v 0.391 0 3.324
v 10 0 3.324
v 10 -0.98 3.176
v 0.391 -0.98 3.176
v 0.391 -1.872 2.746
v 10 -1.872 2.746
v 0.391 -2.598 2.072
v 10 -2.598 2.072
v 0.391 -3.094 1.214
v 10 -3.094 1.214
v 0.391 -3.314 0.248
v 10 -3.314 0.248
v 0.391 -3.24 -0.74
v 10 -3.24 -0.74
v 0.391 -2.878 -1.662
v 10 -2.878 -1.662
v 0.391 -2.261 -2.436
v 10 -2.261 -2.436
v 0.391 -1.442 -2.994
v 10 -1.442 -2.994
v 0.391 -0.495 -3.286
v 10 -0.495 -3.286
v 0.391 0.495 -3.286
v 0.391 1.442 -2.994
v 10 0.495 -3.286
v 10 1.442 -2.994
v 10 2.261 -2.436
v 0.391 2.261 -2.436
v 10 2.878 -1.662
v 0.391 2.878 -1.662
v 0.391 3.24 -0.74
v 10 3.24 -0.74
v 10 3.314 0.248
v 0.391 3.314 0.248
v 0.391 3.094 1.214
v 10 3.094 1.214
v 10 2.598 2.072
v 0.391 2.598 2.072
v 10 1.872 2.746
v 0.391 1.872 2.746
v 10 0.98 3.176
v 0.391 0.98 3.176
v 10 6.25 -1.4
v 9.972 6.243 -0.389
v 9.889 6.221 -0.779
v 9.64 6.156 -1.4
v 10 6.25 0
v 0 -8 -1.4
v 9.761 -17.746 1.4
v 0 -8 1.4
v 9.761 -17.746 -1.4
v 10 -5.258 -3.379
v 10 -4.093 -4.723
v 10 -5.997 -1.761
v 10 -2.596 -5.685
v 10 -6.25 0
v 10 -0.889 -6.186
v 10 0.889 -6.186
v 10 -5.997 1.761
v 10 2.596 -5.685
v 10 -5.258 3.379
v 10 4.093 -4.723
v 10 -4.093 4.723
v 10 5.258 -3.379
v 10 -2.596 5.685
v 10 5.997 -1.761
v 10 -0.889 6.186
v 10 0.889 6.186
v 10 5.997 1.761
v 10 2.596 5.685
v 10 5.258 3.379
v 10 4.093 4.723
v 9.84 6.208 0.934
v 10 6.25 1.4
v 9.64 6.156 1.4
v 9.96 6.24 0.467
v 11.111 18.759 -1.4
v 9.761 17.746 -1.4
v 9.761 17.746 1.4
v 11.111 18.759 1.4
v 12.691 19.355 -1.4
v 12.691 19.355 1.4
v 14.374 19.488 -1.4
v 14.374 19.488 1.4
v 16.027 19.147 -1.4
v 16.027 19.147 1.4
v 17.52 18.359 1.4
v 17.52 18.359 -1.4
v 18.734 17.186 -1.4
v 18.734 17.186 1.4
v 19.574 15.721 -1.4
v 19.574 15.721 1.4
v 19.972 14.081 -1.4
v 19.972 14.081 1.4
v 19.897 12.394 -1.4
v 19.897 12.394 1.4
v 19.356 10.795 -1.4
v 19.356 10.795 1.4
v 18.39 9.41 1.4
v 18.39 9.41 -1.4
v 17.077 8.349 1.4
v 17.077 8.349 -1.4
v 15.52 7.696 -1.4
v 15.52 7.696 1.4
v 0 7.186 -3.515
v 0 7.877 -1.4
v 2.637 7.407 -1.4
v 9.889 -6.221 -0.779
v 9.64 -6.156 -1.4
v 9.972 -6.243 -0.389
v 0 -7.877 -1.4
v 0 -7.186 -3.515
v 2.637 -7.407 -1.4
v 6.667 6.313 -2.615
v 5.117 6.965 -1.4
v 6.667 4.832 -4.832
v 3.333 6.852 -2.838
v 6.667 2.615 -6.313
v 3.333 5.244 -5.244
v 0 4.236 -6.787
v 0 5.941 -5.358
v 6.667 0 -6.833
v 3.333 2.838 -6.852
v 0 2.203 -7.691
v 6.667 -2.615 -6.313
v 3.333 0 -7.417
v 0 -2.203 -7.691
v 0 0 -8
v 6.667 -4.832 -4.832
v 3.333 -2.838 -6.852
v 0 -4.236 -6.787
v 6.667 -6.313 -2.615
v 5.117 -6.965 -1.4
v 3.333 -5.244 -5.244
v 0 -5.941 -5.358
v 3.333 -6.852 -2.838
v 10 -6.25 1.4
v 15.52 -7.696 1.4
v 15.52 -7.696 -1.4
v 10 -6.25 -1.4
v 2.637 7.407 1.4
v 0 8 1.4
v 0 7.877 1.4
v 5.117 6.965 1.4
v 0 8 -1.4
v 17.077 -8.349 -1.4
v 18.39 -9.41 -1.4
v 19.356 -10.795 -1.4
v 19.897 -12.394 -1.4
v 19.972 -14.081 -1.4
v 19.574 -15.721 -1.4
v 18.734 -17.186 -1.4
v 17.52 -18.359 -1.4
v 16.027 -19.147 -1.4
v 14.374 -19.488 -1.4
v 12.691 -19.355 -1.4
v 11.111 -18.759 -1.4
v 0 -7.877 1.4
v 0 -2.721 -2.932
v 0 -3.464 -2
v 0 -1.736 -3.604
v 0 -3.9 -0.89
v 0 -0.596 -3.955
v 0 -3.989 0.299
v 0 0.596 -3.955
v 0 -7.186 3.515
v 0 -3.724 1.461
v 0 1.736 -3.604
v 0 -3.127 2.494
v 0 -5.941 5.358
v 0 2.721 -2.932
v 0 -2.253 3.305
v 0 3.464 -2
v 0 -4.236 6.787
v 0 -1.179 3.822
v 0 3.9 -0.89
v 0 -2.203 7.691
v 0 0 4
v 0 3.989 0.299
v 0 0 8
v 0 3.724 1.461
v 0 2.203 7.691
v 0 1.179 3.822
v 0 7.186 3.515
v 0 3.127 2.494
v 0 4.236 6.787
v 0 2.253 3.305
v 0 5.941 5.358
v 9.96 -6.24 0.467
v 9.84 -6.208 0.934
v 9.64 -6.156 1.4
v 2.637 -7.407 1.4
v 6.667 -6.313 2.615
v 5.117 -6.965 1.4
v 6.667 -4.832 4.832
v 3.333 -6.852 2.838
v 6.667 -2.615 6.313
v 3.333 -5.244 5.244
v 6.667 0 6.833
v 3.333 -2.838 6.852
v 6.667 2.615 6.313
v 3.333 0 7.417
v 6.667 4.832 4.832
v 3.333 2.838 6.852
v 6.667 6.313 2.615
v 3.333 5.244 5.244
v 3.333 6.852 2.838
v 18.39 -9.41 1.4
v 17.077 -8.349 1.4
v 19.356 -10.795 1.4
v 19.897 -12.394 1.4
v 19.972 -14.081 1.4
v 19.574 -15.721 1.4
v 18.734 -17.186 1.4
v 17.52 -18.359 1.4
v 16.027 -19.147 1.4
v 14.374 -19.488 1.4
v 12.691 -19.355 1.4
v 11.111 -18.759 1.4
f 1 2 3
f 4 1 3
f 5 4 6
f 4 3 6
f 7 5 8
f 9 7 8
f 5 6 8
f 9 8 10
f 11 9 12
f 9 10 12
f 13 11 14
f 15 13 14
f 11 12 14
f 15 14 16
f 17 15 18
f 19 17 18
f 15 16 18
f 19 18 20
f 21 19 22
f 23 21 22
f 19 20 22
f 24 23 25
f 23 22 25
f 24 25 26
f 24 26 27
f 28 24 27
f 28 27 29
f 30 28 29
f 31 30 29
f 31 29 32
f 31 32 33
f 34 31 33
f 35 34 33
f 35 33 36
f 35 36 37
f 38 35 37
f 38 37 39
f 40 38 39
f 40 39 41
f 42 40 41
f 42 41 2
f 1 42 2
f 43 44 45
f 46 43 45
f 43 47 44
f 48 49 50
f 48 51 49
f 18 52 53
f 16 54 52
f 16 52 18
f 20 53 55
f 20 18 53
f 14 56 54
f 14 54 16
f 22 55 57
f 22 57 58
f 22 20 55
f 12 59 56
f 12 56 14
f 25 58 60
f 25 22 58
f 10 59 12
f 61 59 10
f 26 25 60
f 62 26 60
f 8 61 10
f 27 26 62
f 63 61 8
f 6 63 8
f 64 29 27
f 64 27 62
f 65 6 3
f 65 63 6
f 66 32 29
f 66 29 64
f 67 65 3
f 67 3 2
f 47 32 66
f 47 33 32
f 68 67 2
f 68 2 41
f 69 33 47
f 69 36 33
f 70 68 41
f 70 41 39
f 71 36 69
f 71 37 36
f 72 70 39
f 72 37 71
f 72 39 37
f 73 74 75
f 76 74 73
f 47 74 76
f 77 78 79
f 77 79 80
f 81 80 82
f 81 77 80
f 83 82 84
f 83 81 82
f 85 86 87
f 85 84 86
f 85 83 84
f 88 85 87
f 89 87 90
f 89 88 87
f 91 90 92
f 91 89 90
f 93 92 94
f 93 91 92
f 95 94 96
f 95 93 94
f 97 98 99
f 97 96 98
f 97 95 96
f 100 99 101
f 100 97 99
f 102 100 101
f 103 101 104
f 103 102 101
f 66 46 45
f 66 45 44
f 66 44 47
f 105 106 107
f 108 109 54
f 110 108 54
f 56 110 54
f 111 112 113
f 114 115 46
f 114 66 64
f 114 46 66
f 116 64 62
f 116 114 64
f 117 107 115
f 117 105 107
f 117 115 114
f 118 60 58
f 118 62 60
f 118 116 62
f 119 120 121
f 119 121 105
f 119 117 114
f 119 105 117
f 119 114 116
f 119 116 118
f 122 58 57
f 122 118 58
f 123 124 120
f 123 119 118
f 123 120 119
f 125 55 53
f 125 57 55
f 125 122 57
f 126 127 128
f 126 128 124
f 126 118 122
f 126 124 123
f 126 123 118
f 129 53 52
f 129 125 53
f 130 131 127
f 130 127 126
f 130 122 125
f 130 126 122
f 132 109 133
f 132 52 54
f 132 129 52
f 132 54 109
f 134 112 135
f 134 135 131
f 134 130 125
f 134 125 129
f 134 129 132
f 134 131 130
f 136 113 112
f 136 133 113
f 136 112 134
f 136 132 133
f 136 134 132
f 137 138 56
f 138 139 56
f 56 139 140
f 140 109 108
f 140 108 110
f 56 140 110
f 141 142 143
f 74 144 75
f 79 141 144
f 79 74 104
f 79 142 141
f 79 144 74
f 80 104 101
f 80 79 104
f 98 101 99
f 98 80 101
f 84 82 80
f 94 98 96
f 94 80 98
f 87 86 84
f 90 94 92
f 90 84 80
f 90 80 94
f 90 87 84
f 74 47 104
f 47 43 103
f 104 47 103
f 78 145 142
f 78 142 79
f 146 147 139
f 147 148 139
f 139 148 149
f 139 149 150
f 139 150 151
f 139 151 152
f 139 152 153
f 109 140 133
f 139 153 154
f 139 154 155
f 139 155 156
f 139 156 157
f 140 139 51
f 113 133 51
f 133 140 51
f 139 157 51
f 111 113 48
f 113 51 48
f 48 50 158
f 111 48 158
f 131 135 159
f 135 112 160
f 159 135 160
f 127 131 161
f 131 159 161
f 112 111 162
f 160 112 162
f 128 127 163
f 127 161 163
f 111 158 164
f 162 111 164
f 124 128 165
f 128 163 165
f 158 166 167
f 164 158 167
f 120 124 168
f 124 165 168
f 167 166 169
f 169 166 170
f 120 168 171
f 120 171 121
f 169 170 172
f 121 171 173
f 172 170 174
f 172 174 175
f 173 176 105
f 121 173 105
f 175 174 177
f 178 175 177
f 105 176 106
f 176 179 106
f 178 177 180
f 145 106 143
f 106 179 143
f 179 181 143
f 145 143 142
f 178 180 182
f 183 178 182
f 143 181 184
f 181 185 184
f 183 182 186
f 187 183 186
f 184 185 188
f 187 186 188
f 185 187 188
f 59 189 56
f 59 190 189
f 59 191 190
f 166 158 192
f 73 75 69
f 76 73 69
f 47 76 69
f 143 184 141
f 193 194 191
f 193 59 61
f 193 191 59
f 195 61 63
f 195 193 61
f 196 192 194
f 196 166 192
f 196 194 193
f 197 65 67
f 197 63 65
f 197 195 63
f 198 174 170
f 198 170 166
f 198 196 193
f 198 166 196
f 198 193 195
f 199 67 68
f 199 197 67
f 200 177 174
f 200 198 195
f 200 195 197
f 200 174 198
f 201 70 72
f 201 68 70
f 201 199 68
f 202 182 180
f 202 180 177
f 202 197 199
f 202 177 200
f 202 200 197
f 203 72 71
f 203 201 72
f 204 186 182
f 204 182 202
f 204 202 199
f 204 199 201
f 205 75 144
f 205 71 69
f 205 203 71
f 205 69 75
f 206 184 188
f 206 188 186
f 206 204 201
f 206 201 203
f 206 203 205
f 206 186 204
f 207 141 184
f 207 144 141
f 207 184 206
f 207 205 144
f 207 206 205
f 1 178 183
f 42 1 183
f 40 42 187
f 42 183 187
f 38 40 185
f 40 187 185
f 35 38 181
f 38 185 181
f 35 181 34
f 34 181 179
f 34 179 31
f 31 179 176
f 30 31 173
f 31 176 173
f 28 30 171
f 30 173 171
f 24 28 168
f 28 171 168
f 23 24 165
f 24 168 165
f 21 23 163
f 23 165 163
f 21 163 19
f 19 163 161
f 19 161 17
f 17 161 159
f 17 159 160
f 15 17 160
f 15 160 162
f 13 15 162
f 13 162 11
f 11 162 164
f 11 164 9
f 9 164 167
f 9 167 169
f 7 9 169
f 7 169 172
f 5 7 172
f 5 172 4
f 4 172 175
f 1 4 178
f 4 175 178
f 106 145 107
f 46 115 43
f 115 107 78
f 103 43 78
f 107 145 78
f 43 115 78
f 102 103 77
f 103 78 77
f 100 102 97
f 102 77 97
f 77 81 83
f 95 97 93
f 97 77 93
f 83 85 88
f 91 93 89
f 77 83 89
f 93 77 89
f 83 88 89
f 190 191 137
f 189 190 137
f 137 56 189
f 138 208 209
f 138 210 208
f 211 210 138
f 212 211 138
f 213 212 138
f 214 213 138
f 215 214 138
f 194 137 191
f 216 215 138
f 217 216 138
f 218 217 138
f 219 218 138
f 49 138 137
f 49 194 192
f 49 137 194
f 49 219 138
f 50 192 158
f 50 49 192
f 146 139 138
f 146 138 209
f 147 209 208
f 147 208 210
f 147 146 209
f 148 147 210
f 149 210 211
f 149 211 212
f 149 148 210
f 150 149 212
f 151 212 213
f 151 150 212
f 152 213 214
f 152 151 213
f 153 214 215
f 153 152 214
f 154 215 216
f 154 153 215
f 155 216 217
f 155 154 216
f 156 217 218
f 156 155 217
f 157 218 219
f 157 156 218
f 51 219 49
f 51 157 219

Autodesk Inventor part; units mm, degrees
ref_plane "YZ Plane" through (0, 0, 0) normal (1, 0, 0) x (0, 1, 0)
ref_plane "XZ Plane" through (0, 0, 0) normal (0, 1, 0) x (-1, 0, 0)
sketch "Sketch1" plane through (0, 0, 0) normal (0, 0, 1) x (1, 0, 0)
  line L0 (0, 0) -> (10, 0)
  line L1 (0, 0) -> (0, 8)
  line L2 (10, 6.25) -> (10, 0)
  line L3 (0, 8) -> (9.7606, 17.7458)
  line L4 (10, 6.25) -> (15.5202, 7.6958)
  arc A0 (15.5202, 7.6958) -> (9.7606, 17.7458) centre (14, 13.5) ccw
  line L5 (10, 6.25) -> (0, 8)
  line L6 (10, 6.25) -> (0, 3.6309)
  dimension "d0" = 12.5
  dimension "d1" = 14
  dimension "d2" = 13.5
  dimension "d3" = 6
  dimension "d4" = 10
  dimension "d5" = 16
revolve "Body" add sketch "Sketch1" angle 360 about axis through (0, 0, 0) along (1, 0, 0) contours L1 L6 L2 L0 | L1 L5 L6
extrude "Wing1" add sketch "Sketch1" along normal mid plane 2.8 contours L1 L5 L6 | L5 L3 A0 L4
fillet "Fillet1" [suppressed]
mirror "Wing2" about plane through (0, 0, 0) normal (0, 1, 0) of "Wing1"
sketch "Sketch2" plane through (0, 0, 0) normal (1, 0, 0) x (0, 1, 0)
  line L0 (0, -14) -> (0, 14) projected
  line L1 (-14, 0) -> (14, 0) projected
  point P0 (0, 0)
hole "Thread" at (0, 0, 0) direction (1, 0, 0) diameter 6.647 end through all thread size "M8x1.25" class "6H" standard "ISO Metric profile"
chamfer "Chamfer1" distance 0.6766 angle 30 1 edges at (0, 0, -3.3235) measured on face at (0, -6.3508, -0.1335)
ref_plane "Work Plane1" through (46.6583, 0, 0) normal (0, 0, -1) x (1, 0, 0)
equation "\"d0\" = KOD2"
equation "\"d1\" = KOH1 - RR"
equation "\"d2\" = 0.5 * E0 - RR"
equation "\"d3\" = RR"
equation "\"d4\" = KOH"
equation "\"d5\" = KOD"
equation "\"d6\" = SW"
equation "\"d8\" = 0.333333 * SW"
equation "\"d9\" = -0.5 * GD1 + 0.5 * NND"
equation "\"d109\" = -0.5 * GD1 + 0.5 * NND"
equation "\"NND\" = 8"
equation "\"KOH\" = 10"
equation "\"KOH1\" = 20"
equation "\"SW\" = 2.8"
equation "\"KOD\" = 16"
equation "\"KOD2\" = 12.5"
equation "\"RR\" = 6"
equation "\"E0\" = 39"
equation "\"GUL\" = 0.541266 * PTC"
equation "\"BOR\" = 0"
equation "\"PTC\" = 1.25"
equation "\"THREADDIA\" = 8"
equation "\"TOA\" = 30deg"
equation "\"RR2\" = 3"
equation "\"SW1\" = 4.4"
equation "\"GAL\" = 0.541266 * PTC"
equation "\"GD1\" = 6.646835"
properties part number "DIN 315 - M8" material "Steel, Mild"
